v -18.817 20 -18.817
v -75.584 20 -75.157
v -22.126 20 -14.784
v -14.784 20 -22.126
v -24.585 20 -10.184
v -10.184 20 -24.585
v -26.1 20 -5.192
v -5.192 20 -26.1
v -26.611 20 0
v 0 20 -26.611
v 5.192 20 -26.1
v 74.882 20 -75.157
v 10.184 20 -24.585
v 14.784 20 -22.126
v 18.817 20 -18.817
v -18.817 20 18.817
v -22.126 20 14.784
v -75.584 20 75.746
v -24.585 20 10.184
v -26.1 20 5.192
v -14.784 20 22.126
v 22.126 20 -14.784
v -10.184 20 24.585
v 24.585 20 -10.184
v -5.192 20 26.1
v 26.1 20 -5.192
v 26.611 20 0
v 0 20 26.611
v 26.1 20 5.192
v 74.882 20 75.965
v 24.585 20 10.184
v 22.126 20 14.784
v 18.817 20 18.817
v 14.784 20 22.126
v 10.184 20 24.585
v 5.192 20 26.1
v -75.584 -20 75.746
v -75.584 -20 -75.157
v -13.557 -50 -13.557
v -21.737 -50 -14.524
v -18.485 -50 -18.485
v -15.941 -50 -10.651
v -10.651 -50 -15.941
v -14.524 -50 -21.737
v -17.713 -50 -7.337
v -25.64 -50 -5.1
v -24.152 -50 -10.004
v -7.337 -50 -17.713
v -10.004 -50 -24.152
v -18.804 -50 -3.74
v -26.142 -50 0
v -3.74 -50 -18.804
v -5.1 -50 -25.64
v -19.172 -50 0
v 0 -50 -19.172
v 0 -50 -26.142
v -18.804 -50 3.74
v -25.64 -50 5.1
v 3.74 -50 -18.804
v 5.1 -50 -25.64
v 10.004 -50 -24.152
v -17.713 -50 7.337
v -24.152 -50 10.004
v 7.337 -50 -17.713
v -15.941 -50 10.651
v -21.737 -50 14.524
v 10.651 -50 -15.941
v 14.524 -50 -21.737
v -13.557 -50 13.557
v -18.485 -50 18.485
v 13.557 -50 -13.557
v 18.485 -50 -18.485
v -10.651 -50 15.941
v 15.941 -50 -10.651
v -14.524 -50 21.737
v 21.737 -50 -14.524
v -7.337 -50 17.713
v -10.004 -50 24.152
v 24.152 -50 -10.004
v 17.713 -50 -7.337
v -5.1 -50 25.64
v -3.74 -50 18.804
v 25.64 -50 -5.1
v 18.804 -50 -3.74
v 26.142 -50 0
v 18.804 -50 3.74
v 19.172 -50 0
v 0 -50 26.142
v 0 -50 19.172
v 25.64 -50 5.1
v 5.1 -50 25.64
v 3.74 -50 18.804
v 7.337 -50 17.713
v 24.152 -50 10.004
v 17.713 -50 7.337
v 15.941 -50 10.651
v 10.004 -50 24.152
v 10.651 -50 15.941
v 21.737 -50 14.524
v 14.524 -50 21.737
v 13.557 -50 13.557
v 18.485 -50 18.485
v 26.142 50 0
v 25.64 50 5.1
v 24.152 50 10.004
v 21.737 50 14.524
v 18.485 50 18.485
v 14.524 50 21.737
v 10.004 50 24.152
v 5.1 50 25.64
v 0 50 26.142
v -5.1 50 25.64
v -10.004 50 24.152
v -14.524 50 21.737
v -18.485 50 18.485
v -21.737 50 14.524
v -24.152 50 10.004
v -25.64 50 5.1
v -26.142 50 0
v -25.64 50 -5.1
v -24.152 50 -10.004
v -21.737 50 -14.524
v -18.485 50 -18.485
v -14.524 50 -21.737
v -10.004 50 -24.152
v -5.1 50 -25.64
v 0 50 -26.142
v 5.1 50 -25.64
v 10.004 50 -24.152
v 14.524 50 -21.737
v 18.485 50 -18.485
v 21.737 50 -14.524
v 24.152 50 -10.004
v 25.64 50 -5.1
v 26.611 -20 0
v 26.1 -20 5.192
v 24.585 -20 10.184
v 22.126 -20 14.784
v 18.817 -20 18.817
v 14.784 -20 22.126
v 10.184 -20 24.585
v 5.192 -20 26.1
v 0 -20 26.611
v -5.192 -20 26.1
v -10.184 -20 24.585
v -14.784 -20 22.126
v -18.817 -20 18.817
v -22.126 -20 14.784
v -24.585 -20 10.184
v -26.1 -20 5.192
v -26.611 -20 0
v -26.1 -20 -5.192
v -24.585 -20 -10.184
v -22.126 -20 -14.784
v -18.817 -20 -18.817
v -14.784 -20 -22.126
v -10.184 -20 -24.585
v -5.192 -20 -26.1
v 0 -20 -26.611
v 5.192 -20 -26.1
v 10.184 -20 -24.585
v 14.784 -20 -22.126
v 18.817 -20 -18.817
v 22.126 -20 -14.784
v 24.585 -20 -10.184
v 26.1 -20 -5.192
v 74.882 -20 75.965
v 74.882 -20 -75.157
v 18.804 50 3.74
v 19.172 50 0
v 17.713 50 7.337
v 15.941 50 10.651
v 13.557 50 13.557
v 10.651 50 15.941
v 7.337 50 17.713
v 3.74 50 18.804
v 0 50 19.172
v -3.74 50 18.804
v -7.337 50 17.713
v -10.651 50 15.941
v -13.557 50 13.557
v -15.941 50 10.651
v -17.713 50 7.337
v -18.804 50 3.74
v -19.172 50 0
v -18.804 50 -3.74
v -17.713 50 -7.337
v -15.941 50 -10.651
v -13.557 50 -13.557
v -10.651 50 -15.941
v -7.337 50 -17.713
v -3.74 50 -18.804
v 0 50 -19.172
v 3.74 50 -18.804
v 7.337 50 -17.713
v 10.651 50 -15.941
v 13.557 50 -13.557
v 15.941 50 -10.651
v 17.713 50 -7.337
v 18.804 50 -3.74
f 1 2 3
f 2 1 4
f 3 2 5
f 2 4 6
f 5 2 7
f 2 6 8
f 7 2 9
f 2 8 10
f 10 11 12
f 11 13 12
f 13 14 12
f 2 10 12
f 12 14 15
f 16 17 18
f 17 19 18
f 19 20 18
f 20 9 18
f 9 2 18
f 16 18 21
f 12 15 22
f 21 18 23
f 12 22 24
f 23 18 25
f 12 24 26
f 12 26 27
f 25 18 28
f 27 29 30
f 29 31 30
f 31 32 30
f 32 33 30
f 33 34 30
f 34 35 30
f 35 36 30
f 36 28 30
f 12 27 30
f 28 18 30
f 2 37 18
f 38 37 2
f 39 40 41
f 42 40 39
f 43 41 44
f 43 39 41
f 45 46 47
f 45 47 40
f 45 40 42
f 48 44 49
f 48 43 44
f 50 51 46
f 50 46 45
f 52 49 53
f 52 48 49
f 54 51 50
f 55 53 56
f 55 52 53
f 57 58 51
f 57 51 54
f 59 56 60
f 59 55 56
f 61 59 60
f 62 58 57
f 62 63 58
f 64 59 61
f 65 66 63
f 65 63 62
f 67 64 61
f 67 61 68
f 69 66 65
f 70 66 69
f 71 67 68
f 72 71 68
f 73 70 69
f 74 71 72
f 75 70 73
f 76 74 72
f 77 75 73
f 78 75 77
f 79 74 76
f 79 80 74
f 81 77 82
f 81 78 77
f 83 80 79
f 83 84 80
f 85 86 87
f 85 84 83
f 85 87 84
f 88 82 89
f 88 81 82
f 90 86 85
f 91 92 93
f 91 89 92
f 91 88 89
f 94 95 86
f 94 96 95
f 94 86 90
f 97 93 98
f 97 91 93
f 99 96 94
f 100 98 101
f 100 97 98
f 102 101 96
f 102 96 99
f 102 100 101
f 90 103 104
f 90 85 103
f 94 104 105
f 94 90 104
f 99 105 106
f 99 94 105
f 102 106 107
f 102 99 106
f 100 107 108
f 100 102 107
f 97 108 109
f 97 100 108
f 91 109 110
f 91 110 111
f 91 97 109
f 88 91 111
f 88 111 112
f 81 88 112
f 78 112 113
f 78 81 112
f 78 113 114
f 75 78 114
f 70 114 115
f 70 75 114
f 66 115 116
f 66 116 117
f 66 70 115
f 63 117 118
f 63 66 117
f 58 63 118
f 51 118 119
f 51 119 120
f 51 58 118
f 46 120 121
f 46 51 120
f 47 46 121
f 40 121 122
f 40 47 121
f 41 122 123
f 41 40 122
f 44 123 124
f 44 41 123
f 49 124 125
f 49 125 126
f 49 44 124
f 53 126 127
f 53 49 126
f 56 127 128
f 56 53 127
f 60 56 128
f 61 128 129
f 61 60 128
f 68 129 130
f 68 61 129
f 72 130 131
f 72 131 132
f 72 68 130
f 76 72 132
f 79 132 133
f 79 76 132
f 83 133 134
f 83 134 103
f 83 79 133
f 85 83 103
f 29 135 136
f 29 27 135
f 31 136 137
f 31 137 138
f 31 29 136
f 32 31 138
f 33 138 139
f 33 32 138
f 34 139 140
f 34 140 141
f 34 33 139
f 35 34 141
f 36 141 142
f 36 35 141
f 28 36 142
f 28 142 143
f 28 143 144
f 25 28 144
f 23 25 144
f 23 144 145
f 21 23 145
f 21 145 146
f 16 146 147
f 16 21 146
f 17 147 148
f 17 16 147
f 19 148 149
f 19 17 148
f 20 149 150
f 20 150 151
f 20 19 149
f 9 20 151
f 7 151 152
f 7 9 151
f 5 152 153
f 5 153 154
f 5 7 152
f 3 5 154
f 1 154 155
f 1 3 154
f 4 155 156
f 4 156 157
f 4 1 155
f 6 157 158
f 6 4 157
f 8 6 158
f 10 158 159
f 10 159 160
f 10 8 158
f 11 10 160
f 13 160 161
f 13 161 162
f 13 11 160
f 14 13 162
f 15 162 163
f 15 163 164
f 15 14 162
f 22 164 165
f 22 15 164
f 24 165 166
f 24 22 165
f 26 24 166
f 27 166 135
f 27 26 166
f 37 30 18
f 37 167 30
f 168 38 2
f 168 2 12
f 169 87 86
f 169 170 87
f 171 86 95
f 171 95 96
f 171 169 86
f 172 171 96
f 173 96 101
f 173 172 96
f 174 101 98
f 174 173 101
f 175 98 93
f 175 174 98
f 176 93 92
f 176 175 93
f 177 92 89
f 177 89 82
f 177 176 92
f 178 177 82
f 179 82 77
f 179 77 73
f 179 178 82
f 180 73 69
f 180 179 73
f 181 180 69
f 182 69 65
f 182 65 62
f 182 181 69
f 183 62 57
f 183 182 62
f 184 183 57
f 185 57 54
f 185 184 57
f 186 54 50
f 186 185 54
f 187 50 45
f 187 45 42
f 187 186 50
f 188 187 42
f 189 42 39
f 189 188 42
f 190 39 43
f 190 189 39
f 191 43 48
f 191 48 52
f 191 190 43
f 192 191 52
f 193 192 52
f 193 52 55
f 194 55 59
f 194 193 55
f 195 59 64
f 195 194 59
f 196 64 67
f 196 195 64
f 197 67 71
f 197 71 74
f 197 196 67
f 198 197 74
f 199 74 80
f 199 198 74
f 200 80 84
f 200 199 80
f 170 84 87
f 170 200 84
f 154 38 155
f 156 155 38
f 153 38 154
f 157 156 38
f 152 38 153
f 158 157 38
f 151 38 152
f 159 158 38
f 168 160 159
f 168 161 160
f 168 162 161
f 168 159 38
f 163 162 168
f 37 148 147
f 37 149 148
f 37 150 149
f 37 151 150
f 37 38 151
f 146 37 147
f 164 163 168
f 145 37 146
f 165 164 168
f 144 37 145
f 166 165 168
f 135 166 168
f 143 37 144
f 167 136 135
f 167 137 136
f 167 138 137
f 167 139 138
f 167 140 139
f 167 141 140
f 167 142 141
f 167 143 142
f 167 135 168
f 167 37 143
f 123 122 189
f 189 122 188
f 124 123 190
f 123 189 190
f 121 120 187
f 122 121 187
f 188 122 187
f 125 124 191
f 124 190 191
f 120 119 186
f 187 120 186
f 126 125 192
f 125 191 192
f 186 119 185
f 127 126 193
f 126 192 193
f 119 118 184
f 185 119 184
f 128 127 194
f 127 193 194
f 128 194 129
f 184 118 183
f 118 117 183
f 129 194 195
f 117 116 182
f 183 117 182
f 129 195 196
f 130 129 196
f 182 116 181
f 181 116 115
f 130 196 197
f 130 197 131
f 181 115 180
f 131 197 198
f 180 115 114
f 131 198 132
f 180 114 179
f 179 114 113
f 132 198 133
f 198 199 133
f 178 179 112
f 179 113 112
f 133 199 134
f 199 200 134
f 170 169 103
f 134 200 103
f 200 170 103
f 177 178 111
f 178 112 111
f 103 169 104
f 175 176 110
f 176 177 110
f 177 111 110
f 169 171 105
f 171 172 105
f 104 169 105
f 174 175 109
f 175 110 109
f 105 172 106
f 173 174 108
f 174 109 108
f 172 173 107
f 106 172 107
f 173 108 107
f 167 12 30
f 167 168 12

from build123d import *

# Parameters (mm, degrees)
F0_R     = 26.14227
F0_R_2   = 19.17206
F1_DEPTH = 50
F3_R     = 26.610937
F4_DEPTH = 20


with BuildPart() as f1:
    # F0 (on Front) → F1 (new body, symmetric)
    with BuildSketch(Plane.XZ):
        Circle(F0_R)
        Circle(F0_R_2, mode=Mode.SUBTRACT)
    extrude(amount=F1_DEPTH, both=True)


with BuildPart() as f4:
    # F3 (on face) → F4 (new body, symmetric)
    with BuildSketch(Plane.XZ):
        Polygon((74.882455, 75.964503), (-75.583741, 75.746119), (-75.583741, -75.156845), (74.882455, -75.156845), align=None)
        Circle(F3_R, mode=Mode.SUBTRACT)
    extrude(amount=F4_DEPTH, both=True)


solid = Compound([f1.part, f4.part])
